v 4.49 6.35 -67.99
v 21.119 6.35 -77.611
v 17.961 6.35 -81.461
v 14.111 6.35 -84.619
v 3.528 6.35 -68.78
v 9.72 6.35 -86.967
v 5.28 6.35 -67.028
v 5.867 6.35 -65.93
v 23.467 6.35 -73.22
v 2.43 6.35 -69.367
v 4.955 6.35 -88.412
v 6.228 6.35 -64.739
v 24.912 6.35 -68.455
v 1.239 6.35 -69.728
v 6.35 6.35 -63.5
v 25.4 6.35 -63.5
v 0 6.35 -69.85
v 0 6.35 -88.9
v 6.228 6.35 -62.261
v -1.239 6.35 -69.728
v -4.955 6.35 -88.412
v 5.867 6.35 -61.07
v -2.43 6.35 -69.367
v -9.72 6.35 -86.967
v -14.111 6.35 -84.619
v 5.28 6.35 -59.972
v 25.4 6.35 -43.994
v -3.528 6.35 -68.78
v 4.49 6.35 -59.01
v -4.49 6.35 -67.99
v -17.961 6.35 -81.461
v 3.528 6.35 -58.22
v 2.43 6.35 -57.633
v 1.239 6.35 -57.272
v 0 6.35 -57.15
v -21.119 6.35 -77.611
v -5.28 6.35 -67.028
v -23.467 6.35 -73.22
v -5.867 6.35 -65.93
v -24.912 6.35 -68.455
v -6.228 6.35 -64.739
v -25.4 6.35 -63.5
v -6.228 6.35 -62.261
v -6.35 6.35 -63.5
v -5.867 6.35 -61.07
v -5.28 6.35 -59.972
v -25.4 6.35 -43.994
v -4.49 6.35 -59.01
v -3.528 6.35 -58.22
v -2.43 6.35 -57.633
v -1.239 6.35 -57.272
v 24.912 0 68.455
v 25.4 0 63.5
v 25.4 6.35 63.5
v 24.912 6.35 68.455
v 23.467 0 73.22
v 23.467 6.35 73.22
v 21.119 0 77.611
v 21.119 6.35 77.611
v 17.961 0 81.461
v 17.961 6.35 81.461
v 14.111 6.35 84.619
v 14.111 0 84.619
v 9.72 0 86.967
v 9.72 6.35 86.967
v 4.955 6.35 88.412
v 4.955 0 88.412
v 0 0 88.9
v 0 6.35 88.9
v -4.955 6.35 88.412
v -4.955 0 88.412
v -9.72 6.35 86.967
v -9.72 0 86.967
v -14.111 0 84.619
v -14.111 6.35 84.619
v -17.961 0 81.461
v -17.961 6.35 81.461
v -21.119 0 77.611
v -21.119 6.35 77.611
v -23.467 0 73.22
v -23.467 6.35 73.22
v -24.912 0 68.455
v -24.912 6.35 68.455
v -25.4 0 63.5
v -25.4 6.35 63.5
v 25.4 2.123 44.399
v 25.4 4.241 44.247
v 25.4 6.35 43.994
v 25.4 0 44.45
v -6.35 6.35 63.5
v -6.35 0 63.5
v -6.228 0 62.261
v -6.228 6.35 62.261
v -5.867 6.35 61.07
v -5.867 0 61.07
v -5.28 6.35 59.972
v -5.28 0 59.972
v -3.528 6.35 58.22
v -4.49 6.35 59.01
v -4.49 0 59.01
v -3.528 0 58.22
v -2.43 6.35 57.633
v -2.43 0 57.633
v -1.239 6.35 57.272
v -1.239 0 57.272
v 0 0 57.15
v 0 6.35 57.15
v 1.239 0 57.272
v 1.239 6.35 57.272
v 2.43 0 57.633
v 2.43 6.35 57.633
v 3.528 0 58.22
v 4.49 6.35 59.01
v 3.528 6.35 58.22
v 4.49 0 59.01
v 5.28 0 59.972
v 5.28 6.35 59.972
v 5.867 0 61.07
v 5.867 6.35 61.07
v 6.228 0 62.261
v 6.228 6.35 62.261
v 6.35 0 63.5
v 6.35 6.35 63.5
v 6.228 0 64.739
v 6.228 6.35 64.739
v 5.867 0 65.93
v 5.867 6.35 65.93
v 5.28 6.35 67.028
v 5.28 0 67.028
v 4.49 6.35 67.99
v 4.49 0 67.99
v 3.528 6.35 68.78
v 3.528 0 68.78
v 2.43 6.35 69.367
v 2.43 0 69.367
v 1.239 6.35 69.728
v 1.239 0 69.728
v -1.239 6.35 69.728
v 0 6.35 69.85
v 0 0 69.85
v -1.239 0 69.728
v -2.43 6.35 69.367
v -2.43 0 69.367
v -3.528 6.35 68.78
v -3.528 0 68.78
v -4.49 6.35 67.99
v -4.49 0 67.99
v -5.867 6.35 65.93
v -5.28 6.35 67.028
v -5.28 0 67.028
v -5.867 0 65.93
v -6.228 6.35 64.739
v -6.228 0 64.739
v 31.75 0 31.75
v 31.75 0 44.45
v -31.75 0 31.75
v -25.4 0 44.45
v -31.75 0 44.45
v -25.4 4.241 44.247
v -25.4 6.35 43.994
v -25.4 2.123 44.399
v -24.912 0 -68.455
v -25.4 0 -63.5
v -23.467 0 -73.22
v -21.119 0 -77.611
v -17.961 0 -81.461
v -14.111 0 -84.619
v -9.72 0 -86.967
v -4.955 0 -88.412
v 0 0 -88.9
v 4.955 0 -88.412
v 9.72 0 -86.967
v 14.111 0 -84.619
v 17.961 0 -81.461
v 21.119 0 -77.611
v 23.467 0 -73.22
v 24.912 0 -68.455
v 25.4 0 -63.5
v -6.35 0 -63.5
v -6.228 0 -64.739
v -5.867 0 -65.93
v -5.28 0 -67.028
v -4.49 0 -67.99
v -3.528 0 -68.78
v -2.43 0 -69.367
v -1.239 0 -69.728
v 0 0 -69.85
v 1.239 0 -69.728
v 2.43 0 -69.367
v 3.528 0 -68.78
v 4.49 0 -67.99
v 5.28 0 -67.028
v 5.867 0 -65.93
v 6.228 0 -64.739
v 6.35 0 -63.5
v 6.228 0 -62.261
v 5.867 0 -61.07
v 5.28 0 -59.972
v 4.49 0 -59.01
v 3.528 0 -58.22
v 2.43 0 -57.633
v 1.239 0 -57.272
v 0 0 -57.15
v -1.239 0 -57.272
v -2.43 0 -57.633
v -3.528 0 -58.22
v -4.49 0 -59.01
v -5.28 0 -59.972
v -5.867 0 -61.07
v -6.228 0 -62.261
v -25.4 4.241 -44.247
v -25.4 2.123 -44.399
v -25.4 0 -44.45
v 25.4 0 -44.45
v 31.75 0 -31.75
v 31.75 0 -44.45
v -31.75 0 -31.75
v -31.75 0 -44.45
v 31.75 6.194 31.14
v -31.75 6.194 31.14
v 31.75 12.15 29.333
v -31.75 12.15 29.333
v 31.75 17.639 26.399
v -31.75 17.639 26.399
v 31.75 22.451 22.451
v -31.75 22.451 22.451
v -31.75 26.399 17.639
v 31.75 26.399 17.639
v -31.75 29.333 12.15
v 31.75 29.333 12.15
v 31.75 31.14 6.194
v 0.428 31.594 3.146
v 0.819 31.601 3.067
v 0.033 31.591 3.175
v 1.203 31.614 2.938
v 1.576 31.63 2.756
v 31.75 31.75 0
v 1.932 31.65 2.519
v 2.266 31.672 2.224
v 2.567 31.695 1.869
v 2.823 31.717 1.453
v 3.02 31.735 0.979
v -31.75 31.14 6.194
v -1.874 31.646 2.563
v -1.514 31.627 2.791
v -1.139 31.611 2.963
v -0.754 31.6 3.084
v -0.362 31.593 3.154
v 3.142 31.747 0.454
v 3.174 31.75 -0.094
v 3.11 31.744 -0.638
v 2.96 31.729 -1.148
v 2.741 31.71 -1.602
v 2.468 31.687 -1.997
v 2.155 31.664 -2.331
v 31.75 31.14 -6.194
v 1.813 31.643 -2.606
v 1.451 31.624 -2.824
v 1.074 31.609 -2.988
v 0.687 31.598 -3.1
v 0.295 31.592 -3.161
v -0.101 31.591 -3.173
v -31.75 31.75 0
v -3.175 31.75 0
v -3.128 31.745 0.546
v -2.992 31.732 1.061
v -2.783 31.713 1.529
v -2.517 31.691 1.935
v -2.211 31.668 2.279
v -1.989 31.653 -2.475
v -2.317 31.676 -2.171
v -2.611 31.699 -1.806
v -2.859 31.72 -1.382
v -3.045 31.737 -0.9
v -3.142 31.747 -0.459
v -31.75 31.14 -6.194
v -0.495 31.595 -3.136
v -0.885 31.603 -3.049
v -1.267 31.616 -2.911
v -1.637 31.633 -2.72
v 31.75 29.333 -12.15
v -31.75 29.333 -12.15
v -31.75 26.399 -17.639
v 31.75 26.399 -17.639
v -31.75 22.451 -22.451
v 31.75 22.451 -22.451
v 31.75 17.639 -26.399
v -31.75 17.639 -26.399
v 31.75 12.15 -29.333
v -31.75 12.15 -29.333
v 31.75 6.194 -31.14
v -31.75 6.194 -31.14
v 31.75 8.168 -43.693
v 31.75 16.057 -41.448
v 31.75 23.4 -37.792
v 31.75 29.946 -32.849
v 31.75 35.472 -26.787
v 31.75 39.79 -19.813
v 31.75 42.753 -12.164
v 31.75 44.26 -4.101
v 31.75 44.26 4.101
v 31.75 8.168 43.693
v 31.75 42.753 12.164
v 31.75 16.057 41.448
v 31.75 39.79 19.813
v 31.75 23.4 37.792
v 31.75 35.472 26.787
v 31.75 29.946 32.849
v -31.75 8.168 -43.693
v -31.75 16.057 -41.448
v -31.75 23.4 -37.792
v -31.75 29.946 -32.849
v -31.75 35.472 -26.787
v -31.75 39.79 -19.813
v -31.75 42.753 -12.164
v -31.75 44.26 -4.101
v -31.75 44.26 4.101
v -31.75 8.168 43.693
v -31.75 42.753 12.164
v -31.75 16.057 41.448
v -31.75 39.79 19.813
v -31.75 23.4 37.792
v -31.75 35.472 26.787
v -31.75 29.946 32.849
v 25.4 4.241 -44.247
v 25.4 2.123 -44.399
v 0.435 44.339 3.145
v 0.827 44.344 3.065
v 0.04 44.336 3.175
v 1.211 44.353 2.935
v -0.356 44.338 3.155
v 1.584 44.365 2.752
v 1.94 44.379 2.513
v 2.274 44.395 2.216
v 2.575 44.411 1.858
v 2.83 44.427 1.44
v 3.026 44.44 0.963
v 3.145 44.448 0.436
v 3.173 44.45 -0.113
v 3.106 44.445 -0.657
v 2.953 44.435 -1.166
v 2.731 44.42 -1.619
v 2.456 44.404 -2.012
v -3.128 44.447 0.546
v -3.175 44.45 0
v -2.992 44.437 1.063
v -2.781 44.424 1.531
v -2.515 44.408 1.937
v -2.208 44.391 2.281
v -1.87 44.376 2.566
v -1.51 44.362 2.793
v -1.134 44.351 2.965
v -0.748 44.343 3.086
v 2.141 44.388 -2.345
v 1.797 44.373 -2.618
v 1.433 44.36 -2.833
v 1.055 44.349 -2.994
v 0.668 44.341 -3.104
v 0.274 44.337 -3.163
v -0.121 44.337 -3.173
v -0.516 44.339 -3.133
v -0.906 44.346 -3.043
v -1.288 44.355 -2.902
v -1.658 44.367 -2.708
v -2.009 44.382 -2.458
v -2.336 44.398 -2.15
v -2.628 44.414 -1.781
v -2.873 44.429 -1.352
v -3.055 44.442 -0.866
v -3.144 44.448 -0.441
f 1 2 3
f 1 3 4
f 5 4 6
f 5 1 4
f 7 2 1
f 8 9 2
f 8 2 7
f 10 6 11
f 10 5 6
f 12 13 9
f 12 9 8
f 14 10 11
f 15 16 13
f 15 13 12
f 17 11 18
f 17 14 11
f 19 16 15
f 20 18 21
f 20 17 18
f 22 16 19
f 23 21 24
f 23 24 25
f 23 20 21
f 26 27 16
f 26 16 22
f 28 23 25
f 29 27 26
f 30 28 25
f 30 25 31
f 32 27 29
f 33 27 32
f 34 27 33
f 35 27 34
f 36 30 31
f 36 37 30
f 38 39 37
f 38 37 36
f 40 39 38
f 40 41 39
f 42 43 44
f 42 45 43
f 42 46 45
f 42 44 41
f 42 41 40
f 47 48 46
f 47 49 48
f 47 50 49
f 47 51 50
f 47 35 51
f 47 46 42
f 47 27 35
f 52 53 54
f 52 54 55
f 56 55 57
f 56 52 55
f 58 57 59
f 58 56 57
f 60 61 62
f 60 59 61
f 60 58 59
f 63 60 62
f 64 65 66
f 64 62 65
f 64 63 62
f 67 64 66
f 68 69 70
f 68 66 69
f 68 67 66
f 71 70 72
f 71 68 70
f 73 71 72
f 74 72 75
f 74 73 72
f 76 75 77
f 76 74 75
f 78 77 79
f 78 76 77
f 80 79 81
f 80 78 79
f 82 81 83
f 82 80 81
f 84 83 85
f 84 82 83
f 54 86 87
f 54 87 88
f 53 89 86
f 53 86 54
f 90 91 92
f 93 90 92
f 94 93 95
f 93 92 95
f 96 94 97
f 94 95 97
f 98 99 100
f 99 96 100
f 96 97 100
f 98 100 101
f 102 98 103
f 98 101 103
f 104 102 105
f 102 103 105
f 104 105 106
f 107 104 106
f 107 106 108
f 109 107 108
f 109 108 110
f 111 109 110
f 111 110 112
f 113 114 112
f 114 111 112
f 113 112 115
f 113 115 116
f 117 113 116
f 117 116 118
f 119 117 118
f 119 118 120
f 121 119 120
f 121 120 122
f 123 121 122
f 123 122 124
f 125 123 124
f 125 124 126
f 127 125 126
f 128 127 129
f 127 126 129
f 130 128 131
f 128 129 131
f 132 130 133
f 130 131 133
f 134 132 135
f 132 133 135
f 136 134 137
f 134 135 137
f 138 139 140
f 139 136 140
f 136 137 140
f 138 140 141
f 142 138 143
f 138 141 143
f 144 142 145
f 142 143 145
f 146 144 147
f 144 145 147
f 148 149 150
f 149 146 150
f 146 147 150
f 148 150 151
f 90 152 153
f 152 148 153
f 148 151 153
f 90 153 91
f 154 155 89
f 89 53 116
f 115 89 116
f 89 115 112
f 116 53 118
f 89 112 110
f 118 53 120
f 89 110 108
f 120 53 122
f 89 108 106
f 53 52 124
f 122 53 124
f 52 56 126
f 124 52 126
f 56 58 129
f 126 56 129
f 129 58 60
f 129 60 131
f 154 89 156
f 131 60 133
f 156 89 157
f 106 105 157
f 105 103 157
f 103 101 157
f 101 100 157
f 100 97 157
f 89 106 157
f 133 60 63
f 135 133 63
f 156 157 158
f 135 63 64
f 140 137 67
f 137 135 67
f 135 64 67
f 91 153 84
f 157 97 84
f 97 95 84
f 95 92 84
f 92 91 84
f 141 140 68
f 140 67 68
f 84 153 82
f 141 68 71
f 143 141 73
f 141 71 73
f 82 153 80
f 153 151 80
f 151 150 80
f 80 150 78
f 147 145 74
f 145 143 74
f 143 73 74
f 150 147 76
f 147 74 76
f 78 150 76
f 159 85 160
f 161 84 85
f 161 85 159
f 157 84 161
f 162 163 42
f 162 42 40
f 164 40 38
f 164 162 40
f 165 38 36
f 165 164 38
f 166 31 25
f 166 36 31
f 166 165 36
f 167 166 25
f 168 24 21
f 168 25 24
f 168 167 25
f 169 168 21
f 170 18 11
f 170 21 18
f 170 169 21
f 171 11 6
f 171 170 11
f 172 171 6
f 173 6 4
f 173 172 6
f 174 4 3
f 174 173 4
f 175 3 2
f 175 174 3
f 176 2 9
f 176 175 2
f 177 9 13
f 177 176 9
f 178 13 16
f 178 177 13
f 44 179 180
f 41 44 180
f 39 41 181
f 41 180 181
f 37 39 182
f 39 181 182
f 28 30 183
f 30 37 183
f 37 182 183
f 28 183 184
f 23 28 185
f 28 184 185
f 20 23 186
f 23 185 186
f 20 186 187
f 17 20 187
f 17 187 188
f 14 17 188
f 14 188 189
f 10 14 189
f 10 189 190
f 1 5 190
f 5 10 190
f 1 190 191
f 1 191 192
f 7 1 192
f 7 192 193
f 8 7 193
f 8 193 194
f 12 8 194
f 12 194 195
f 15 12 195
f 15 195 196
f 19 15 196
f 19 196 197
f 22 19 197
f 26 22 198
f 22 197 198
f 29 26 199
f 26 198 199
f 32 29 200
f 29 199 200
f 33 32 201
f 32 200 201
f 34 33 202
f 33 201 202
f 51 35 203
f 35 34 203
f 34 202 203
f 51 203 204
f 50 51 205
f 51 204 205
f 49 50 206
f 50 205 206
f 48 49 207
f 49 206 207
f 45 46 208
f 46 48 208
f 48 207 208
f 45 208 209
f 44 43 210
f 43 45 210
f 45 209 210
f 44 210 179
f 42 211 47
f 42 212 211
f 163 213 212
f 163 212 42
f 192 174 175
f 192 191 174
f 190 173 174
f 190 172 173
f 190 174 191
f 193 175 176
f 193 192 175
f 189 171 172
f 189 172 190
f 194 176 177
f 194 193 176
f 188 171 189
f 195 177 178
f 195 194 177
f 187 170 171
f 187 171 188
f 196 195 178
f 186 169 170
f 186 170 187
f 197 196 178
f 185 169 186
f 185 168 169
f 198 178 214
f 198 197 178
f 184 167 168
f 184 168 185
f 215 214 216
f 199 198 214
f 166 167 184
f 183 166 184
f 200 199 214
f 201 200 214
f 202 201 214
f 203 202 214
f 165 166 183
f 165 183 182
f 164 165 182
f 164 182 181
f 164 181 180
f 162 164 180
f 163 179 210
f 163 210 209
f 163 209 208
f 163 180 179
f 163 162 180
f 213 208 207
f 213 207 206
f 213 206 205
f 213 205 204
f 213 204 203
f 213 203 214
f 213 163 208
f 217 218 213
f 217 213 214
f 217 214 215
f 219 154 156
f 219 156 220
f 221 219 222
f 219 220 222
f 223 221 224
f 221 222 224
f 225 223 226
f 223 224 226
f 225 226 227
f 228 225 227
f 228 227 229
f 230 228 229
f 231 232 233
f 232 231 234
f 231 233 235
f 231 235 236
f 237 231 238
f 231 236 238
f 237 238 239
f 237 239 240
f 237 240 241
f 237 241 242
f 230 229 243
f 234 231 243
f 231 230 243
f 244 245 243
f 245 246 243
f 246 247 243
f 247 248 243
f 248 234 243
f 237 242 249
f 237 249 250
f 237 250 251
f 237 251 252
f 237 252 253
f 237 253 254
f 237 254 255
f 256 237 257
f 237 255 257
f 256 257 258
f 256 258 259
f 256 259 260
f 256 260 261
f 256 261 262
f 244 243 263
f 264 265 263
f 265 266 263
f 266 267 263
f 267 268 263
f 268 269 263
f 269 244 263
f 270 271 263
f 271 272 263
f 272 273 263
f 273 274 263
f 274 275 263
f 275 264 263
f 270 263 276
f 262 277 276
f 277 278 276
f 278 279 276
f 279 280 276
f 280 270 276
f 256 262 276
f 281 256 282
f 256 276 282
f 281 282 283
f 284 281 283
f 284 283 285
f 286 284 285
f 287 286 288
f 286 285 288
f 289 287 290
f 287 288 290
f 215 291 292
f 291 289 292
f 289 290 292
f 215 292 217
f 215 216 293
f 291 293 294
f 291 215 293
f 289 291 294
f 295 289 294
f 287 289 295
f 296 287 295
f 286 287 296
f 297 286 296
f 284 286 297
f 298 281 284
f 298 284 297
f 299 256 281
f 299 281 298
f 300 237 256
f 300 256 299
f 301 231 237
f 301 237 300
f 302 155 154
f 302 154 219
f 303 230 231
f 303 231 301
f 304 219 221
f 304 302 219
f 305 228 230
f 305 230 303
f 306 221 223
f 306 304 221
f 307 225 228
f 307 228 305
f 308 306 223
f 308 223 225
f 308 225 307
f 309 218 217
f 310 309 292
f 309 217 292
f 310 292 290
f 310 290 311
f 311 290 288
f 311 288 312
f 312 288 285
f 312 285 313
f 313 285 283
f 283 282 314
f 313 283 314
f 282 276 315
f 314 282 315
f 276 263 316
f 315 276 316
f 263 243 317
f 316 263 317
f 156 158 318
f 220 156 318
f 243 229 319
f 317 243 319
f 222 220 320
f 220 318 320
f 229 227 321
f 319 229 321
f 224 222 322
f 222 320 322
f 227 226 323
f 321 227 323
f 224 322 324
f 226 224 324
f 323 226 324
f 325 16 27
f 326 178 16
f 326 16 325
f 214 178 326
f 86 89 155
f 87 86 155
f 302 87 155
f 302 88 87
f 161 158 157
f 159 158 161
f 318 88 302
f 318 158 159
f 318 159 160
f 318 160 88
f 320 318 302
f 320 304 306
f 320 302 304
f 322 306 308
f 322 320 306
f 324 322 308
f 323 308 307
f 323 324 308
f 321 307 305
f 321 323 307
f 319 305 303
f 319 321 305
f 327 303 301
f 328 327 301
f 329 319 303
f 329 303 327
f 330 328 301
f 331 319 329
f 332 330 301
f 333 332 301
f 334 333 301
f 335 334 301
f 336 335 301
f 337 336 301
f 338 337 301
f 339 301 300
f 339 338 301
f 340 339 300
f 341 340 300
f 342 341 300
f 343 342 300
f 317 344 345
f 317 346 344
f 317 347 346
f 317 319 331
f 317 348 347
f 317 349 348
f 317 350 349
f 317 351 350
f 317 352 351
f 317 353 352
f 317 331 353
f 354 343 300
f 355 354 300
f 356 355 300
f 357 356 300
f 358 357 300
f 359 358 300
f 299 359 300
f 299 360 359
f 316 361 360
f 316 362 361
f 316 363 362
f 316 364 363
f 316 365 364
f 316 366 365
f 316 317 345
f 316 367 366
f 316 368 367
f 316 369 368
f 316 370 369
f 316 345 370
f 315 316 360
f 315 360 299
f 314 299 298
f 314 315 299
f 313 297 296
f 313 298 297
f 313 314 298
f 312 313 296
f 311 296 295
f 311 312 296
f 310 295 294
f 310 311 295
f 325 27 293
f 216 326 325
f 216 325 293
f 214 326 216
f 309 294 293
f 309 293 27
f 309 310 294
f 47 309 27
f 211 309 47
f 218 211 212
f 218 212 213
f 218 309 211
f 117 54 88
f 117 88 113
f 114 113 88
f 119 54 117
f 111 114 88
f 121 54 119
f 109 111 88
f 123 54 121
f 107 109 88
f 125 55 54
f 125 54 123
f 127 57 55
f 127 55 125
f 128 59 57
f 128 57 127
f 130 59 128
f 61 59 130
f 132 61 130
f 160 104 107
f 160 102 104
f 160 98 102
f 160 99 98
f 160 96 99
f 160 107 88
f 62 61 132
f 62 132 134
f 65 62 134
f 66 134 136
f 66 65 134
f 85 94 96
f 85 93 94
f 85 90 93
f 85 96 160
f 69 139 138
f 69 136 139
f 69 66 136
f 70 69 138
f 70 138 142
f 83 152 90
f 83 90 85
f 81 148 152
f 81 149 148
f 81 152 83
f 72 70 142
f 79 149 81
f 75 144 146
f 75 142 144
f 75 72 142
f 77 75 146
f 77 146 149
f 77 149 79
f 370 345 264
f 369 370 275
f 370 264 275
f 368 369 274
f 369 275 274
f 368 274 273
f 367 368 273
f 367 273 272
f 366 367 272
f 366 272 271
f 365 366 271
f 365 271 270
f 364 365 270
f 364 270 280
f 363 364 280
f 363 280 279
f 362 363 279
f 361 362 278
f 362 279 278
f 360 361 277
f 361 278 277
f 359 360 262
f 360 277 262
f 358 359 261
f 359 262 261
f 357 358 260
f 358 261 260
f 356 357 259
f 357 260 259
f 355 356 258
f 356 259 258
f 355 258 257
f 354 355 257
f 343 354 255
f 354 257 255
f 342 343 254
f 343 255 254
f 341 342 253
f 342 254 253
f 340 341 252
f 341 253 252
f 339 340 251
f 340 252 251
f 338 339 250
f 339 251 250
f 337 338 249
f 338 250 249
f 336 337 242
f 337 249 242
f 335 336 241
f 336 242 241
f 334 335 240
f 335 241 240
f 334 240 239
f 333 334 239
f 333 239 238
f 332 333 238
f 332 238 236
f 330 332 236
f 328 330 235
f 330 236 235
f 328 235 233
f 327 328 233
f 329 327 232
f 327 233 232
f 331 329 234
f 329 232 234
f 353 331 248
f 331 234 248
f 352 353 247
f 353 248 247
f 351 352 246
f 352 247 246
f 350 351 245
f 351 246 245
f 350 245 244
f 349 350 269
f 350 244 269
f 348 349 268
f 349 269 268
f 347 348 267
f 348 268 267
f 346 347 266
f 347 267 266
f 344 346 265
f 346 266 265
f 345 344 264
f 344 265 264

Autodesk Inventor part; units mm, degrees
ref_plane "YZ Plane" through (0, 0, 0) normal (1, 0, 0) x (0, 1, 0)
ref_plane "XZ Plane" through (0, 0, 0) normal (0, 1, 0) x (-1, 0, 0)
ref_plane "XY Plane" through (0, 0, 0) normal (0, 0, 1) x (1, 0, 0)
sketch "Sketch1" plane through (0, 0, 0) normal (0, 1, 0) x (-1, 0, 0)
  line L0 (0, 88.9) -> (0, -88.9) construction
  line L1 (25.4, 63.5) -> (25.4, -63.5)
  line L2 (-25.4, -63.5) -> (-25.4, 63.5)
  arc A0 (25.4, 63.5) -> (-25.4, 63.5) centre (0, 63.5) ccw
  arc A1 (-25.4, -63.5) -> (25.4, -63.5) centre (0, -63.5) ccw
  circle A2 centre (0, 63.5) radius 6.35
  circle A3 centre (0, -63.5) radius 6.35
  point P0 (0, 0)
  point P1 (0, 0)
  dimension "d0" = 127
  dimension "d1" = 12.7
  dimension "d2" = 12.7
  dimension "d3" = 25.4
extrude "BASE" add sketch "Sketch1" along normal blind 6.35
sketch "Sketch2" plane through (0, 0, 0) normal (1, 0, 0) x (0, 1, 0)
  arc A0 (0, -44.45) -> (0, 44.45) centre (0, 0) ccw
  arc A1 (0, -31.75) -> (0, 31.75) centre (0, 0) ccw
  line L0 (0, -63.5) -> (0, 63.5) projected
  dimension "d7" = 44.45
  dimension "d8" = 31.75
extrude "REMOVED CENTER OF BASE" cut sketch "Sketch2" along normal through all both and the other way through all contours L0 A1
extrude "ARCH" add sketch "Sketch2" along normal mid plane 63.5 contours L0 A1 A0
sketch "Sketch3" plane through (0, 0, 0) normal (0, 1, 0) x (-1, 0, 0)
  circle A0 centre (0, 0) radius 3.175
  dimension "d13" = 6.35
extrude "TOPHOLE" cut sketch "Sketch3" along normal through all
equation "\"d2\" = d1"
properties part number "ANS8-TUT-BK" material "Water"
